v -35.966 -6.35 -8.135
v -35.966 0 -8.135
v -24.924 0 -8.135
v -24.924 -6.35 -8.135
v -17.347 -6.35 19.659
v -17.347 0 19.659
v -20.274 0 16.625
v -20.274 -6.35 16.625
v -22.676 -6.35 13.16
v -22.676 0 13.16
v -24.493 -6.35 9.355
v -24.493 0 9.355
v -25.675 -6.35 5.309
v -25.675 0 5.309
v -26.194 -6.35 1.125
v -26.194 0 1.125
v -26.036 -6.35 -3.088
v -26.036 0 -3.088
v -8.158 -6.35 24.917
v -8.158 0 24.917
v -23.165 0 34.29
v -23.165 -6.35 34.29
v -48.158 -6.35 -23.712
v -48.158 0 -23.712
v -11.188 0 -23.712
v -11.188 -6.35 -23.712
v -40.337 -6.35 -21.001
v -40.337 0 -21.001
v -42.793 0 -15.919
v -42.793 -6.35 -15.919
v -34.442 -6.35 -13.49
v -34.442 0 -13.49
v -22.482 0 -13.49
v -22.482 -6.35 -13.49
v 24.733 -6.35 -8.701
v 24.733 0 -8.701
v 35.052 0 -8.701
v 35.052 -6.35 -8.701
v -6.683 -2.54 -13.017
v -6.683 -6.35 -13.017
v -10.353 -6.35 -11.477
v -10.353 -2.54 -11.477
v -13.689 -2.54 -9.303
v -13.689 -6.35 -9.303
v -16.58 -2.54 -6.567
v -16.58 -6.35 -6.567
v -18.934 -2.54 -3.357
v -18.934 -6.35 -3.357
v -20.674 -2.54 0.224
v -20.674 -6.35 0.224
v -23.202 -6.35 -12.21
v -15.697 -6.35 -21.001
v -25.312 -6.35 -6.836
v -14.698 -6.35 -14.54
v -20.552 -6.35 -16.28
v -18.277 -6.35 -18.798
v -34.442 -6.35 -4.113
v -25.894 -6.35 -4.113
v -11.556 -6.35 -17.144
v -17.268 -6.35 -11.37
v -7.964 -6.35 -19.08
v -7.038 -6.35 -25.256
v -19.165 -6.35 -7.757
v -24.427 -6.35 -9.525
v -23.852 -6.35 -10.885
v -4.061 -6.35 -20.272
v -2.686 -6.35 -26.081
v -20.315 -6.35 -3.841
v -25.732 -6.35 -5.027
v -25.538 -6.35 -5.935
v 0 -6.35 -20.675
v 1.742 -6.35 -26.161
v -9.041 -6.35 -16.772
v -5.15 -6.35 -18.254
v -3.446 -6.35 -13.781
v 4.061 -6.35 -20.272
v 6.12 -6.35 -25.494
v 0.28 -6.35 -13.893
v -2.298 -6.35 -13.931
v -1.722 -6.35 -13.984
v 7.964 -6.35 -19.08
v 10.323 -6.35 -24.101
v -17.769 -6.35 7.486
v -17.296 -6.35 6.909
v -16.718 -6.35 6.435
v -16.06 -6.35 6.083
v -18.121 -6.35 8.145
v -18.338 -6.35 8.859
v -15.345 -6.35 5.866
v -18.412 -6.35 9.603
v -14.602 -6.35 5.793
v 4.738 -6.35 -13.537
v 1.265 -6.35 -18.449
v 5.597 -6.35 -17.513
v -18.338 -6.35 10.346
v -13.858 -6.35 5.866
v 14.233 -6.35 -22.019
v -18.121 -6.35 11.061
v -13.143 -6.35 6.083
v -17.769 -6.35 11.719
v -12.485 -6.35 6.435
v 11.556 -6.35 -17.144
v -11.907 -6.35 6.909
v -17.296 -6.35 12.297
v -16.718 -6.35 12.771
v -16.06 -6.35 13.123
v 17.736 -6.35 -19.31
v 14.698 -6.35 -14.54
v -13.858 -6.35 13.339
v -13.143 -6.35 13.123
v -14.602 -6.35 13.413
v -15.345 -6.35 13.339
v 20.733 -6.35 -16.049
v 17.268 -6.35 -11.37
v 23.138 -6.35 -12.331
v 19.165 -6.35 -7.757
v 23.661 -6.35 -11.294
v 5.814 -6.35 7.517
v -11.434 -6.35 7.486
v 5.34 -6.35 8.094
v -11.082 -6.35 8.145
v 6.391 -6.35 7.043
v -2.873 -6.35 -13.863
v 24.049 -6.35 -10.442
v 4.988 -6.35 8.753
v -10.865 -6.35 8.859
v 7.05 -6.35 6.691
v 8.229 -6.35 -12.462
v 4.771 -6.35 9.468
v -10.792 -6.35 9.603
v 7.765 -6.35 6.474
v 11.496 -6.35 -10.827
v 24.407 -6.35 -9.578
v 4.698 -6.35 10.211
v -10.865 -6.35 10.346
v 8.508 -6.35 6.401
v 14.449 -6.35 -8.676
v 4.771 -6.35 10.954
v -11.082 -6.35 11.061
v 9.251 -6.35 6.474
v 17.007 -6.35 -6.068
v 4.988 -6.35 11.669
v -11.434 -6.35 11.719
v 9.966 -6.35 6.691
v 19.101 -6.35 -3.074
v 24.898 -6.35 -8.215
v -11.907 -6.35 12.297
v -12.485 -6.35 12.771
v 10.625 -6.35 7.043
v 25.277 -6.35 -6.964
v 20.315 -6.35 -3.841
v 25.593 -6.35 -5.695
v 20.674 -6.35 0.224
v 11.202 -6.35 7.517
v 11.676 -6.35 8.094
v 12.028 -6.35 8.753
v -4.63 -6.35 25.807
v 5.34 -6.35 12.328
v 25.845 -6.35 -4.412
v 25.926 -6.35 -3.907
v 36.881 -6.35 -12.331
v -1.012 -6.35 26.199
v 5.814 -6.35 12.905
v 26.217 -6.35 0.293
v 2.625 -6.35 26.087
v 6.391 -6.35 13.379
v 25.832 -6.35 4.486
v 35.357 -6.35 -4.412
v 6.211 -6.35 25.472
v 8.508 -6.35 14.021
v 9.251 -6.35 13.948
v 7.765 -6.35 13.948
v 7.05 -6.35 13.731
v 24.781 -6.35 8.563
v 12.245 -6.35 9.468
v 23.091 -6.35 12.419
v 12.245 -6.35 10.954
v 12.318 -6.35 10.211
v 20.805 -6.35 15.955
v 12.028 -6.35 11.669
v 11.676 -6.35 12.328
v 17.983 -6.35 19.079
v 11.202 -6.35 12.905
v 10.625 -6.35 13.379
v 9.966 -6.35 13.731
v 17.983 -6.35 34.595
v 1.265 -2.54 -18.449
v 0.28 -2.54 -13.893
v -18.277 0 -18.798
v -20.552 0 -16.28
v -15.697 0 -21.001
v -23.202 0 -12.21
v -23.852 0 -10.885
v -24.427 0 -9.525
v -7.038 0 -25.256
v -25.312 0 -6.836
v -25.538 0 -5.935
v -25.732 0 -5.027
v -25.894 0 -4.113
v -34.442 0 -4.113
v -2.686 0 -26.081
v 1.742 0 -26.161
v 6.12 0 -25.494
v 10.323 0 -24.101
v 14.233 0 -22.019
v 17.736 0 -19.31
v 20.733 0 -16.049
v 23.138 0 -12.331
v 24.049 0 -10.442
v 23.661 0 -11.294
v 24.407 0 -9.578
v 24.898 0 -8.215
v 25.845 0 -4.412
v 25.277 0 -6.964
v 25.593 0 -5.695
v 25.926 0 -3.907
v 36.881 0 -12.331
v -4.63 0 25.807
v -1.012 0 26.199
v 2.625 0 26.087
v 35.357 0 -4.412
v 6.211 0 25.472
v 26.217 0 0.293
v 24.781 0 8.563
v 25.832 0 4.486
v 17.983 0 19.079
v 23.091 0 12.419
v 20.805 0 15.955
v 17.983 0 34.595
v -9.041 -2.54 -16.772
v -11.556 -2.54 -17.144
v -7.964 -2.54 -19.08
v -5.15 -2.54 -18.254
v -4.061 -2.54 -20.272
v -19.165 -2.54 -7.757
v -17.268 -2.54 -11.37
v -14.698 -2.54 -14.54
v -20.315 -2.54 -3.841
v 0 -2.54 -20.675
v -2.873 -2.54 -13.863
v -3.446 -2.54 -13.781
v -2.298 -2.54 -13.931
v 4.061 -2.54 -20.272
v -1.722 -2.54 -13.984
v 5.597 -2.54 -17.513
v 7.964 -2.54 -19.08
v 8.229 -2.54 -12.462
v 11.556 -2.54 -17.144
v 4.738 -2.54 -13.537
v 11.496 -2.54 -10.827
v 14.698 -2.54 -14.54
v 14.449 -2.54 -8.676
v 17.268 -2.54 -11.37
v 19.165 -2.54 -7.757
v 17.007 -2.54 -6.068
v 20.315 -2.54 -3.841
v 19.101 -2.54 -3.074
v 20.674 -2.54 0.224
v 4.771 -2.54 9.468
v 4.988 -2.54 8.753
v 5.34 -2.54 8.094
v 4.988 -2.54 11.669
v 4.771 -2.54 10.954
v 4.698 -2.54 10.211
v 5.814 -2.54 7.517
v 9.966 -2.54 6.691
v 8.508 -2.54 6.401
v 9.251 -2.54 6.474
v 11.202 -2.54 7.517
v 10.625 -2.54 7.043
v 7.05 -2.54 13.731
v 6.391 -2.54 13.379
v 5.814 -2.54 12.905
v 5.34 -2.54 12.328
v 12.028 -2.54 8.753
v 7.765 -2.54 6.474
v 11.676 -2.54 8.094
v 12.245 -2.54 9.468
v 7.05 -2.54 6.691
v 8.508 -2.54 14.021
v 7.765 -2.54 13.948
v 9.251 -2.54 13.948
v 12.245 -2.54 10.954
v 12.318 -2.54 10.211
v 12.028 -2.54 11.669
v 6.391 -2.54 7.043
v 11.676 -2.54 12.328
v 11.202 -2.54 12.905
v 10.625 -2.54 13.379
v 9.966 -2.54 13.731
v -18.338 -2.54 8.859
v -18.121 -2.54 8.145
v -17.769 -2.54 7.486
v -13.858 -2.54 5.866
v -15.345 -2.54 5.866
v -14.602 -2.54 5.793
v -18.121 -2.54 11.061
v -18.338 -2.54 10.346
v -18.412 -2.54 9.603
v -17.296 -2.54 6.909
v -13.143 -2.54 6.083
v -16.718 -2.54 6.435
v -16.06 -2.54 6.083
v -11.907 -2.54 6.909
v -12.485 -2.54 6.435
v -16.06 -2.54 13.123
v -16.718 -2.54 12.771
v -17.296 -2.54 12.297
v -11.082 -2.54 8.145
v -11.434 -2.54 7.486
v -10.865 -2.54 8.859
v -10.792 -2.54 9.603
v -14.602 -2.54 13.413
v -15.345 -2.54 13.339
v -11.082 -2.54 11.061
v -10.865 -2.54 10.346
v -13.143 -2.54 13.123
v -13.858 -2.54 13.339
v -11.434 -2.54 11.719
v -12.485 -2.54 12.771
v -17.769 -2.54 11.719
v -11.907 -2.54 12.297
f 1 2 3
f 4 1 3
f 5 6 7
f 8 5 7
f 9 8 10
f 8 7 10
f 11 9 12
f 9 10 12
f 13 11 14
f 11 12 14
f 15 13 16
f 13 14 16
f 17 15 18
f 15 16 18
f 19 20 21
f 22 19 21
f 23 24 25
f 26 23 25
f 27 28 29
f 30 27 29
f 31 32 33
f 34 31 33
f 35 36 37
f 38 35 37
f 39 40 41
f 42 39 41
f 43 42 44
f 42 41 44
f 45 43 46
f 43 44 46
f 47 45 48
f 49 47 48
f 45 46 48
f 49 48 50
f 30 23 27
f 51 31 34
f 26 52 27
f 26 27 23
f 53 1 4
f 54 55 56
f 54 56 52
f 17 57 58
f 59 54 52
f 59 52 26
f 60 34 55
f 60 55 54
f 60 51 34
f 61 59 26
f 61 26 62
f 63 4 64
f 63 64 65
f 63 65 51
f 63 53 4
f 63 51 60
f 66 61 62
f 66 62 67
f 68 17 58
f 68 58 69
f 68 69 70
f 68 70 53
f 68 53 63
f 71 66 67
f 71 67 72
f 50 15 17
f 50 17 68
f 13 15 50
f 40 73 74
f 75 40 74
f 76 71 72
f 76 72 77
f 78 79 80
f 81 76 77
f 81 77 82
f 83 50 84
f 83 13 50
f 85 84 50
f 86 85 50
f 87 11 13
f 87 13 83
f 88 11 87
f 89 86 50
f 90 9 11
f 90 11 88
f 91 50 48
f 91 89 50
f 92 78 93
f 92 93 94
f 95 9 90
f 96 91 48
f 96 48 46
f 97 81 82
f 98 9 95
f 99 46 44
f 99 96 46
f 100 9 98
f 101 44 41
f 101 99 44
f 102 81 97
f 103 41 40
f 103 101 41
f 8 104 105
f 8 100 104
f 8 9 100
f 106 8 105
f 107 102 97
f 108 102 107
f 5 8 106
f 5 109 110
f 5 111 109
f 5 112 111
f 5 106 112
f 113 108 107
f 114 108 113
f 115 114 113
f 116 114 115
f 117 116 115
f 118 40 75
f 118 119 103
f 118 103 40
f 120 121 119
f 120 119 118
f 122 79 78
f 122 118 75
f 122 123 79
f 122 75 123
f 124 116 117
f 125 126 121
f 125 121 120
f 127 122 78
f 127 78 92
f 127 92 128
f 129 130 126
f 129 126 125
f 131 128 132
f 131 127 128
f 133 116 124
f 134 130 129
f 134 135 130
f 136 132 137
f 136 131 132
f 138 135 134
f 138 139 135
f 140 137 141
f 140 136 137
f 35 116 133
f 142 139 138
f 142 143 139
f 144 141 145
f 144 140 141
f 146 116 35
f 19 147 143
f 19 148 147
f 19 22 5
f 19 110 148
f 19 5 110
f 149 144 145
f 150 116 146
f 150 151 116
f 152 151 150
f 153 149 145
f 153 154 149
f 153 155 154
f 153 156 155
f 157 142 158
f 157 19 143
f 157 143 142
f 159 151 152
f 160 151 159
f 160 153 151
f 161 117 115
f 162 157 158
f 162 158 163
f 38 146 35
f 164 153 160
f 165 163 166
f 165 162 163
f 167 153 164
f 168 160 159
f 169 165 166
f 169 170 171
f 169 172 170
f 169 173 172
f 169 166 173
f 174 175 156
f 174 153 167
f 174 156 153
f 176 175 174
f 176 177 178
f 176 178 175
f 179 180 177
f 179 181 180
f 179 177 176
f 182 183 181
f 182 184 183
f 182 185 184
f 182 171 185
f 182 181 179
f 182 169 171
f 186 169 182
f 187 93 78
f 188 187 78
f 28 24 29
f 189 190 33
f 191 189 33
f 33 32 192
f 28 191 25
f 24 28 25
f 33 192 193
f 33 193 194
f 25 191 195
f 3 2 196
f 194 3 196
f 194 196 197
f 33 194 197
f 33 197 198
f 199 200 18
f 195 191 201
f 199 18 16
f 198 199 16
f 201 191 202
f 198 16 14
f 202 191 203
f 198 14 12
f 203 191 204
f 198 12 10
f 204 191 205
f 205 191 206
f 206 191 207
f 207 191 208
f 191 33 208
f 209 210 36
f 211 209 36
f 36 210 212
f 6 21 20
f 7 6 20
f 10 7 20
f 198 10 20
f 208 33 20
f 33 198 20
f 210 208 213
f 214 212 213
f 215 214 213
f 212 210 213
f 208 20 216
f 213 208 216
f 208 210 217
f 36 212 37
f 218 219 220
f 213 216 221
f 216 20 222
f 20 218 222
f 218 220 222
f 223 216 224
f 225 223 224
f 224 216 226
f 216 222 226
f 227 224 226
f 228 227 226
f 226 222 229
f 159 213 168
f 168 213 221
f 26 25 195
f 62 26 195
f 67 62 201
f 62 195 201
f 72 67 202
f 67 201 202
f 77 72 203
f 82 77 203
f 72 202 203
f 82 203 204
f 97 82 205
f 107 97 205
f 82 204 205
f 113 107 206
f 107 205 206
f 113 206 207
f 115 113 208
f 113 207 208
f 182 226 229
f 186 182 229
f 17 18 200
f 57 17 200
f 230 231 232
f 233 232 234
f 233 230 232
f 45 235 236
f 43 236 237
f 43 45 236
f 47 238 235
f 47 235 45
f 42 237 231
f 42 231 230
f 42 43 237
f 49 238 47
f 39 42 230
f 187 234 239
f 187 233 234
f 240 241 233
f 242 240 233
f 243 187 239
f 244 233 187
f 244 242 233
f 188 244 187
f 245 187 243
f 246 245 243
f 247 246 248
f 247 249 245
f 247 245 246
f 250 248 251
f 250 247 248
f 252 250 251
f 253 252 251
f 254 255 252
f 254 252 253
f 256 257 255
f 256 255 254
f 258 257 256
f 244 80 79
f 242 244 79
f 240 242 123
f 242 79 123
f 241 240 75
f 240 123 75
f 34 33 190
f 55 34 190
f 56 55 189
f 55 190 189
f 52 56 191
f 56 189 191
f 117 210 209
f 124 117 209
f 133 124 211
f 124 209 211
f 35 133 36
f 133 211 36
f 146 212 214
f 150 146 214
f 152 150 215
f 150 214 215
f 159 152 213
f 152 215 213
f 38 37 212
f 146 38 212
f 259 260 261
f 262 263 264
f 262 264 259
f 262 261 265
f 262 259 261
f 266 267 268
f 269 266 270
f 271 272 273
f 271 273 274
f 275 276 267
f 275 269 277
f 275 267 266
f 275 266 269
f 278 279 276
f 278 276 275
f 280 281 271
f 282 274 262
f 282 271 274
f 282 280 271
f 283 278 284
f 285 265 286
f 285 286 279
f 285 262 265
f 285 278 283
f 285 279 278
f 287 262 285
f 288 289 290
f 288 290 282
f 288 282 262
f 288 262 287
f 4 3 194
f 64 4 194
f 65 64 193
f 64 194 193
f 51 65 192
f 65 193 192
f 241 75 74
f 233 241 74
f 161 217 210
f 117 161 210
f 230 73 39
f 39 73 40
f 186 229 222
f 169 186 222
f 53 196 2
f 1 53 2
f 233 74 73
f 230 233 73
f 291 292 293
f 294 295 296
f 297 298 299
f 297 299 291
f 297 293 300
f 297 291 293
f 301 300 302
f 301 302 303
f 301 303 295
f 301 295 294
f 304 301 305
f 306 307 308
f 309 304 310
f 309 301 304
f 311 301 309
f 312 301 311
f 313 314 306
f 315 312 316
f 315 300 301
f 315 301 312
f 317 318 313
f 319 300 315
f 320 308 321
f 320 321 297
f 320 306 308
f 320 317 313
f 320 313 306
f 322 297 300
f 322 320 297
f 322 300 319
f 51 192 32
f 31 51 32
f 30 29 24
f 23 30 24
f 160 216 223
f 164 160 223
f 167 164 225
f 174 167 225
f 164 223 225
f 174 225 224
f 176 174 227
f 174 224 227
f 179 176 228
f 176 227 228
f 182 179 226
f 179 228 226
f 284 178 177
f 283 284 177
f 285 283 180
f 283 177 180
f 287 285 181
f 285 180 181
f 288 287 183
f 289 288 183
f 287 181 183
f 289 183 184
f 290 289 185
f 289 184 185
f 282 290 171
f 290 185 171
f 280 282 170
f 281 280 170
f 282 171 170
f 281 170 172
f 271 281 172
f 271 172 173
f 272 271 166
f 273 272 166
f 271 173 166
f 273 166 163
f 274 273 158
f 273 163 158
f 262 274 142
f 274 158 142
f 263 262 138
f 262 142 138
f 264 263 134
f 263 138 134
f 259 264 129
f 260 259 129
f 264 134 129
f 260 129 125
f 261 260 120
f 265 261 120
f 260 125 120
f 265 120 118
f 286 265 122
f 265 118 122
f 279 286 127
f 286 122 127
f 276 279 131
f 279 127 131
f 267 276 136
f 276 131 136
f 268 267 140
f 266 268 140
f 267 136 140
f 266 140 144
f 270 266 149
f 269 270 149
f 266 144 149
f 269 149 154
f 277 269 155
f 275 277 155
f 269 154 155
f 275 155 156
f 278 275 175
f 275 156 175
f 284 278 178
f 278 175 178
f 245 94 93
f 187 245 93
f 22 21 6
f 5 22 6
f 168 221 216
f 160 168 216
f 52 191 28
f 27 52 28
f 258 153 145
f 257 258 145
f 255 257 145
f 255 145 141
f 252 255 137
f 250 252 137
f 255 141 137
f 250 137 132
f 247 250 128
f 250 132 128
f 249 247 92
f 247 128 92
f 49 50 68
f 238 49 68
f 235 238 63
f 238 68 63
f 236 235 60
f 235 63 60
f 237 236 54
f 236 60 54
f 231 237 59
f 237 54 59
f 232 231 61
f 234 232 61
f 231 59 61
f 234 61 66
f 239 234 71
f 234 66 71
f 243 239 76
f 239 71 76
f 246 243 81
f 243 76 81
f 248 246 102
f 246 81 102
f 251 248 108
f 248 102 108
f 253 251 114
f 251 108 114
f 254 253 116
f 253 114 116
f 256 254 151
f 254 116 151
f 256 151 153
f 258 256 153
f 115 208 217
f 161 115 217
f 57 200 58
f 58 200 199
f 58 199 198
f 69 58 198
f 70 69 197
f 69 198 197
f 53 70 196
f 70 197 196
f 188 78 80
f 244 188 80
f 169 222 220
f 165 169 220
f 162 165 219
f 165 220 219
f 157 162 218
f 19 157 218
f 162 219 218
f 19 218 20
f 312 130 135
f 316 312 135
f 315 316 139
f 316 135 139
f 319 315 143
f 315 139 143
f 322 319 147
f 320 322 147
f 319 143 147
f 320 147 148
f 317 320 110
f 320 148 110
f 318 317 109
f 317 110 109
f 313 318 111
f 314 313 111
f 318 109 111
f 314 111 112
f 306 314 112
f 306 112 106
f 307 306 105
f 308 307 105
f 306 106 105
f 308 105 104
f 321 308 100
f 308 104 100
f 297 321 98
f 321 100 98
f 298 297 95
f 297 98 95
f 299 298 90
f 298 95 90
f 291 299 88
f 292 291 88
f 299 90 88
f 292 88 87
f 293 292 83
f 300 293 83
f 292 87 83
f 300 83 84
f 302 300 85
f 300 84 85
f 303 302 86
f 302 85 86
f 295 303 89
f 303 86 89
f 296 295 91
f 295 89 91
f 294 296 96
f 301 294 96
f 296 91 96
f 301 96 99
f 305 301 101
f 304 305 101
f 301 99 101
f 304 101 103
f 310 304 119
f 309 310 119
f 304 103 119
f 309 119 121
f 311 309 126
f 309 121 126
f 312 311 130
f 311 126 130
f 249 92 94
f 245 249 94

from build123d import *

# Parameters (mm, degrees)
F1_DEPTH = 6.35
F2_R     = 3.81
F3_DEPTH = 3.81


with BuildPart() as f1:
    # F0 (on Front) → F1 (new body)
    with BuildSketch(Plane.XZ):
        with BuildLine():
            Line((-23.164801, 34.290001), (-17.347254, 19.659236))
            ThreePointArc((-17.347254, 19.659236), (-24.492601, 9.355494), (-26.036071, -3.088009))
            Line((-26.036071, -3.088009), (-34.442399, -4.113362))
            Line((-34.442399, -4.113362), (-25.89388, -4.113362))
            ThreePointArc((-25.89388, -4.113362), (-25.638984, -5.482267), (-25.311773, -6.835709))
            Line((-25.311773, -6.835709), (-35.966402, -8.135295))
            Line((-35.966402, -8.135295), (-24.924481, -8.135295))
            ThreePointArc((-24.924481, -8.135295), (-24.14935, -10.208901), (-23.202056, -12.209725))
            Line((-23.202056, -12.209725), (-34.442401, -13.489514))
            Line((-34.442401, -13.489514), (-22.482121, -13.489514))
            ThreePointArc((-22.482121, -13.489514), (-19.455276, -17.575694), (-15.696574, -21.000722))
            Line((-15.696574, -21.000722), (-40.337007, -21.000722))
            Line((-40.337007, -21.000722), (-42.792861, -15.918796))
            Line((-42.792861, -15.918796), (-48.1584, -23.711554))
            Line((-48.1584, -23.711554), (-11.188163, -23.711554))
            ThreePointArc((-11.188163, -23.711554), (8.251092, -24.886387), (23.137988, -12.330704))
            Line((23.137988, -12.330704), (36.880807, -12.330704))
            Line((36.880807, -12.330704), (23.661428, -11.293785))
            ThreePointArc((23.661428, -11.293785), (24.231756, -10.011733), (24.732677, -8.701004))
            Line((24.732677, -8.701004), (35.052002, -8.701004))
            Line((35.052002, -8.701004), (24.898263, -8.215185))
            ThreePointArc((24.898263, -8.215185), (25.442691, -6.331056), (25.844756, -4.411501))
            Line((25.844756, -4.411501), (35.356801, -4.411501))
            Line((35.356801, -4.411501), (25.925817, -3.907015))
            ThreePointArc((25.925817, -3.907015), (24.780888, 8.562731), (17.9832, 19.079237))
            Line((17.9832, 19.079237), (17.9832, 34.5948))
            Line((17.9832, 34.5948), (6.210996, 25.472265))
            ThreePointArc((6.210996, 25.472265), (-1.012157, 26.199014), (-8.15771, 24.917153))
            Line((-8.15771, 24.917153), (-23.164801, 34.290001))
        make_face()
    extrude(amount=F1_DEPTH)

    # F2 (on face) → F3 (cut)
    with BuildSketch(Plane.XZ.offset(6.35)):
        with Locations((8.507902, 10.2108)):
            Circle(F2_R)
        with Locations((-14.601506, 9.602658)):
            Circle(F2_R)
        with BuildLine():
            ThreePointArc((-6.682666, -13.016536), (-15.195966, -8.000344), (-20.67365, 0.223613))
            ThreePointArc((-20.67365, 0.223613), (0, -20.674859), (20.67365, 0.223613))
            ThreePointArc((20.67365, 0.223613), (14.449008, -8.675643), (4.737722, -13.537109))
            Line((4.737722, -13.537109), (5.596831, -17.513046))
            Line((5.596831, -17.513046), (1.264551, -18.449153))
            Line((1.264551, -18.449153), (0.280041, -13.892863))
            Line((0.280041, -13.892863), (-1.722237, -13.983534))
            ThreePointArc((-1.722237, -13.983534), (-2.586056, -13.898947), (-3.445889, -13.780519))
            Line((-3.445889, -13.780519), (-5.150155, -18.254217))
            Line((-5.150155, -18.254217), (-9.041306, -16.771873))
            Line((-9.041306, -16.771873), (-6.682666, -13.016536))
        make_face()
    extrude(amount=-F3_DEPTH, mode=Mode.SUBTRACT)


solid = f1.part
